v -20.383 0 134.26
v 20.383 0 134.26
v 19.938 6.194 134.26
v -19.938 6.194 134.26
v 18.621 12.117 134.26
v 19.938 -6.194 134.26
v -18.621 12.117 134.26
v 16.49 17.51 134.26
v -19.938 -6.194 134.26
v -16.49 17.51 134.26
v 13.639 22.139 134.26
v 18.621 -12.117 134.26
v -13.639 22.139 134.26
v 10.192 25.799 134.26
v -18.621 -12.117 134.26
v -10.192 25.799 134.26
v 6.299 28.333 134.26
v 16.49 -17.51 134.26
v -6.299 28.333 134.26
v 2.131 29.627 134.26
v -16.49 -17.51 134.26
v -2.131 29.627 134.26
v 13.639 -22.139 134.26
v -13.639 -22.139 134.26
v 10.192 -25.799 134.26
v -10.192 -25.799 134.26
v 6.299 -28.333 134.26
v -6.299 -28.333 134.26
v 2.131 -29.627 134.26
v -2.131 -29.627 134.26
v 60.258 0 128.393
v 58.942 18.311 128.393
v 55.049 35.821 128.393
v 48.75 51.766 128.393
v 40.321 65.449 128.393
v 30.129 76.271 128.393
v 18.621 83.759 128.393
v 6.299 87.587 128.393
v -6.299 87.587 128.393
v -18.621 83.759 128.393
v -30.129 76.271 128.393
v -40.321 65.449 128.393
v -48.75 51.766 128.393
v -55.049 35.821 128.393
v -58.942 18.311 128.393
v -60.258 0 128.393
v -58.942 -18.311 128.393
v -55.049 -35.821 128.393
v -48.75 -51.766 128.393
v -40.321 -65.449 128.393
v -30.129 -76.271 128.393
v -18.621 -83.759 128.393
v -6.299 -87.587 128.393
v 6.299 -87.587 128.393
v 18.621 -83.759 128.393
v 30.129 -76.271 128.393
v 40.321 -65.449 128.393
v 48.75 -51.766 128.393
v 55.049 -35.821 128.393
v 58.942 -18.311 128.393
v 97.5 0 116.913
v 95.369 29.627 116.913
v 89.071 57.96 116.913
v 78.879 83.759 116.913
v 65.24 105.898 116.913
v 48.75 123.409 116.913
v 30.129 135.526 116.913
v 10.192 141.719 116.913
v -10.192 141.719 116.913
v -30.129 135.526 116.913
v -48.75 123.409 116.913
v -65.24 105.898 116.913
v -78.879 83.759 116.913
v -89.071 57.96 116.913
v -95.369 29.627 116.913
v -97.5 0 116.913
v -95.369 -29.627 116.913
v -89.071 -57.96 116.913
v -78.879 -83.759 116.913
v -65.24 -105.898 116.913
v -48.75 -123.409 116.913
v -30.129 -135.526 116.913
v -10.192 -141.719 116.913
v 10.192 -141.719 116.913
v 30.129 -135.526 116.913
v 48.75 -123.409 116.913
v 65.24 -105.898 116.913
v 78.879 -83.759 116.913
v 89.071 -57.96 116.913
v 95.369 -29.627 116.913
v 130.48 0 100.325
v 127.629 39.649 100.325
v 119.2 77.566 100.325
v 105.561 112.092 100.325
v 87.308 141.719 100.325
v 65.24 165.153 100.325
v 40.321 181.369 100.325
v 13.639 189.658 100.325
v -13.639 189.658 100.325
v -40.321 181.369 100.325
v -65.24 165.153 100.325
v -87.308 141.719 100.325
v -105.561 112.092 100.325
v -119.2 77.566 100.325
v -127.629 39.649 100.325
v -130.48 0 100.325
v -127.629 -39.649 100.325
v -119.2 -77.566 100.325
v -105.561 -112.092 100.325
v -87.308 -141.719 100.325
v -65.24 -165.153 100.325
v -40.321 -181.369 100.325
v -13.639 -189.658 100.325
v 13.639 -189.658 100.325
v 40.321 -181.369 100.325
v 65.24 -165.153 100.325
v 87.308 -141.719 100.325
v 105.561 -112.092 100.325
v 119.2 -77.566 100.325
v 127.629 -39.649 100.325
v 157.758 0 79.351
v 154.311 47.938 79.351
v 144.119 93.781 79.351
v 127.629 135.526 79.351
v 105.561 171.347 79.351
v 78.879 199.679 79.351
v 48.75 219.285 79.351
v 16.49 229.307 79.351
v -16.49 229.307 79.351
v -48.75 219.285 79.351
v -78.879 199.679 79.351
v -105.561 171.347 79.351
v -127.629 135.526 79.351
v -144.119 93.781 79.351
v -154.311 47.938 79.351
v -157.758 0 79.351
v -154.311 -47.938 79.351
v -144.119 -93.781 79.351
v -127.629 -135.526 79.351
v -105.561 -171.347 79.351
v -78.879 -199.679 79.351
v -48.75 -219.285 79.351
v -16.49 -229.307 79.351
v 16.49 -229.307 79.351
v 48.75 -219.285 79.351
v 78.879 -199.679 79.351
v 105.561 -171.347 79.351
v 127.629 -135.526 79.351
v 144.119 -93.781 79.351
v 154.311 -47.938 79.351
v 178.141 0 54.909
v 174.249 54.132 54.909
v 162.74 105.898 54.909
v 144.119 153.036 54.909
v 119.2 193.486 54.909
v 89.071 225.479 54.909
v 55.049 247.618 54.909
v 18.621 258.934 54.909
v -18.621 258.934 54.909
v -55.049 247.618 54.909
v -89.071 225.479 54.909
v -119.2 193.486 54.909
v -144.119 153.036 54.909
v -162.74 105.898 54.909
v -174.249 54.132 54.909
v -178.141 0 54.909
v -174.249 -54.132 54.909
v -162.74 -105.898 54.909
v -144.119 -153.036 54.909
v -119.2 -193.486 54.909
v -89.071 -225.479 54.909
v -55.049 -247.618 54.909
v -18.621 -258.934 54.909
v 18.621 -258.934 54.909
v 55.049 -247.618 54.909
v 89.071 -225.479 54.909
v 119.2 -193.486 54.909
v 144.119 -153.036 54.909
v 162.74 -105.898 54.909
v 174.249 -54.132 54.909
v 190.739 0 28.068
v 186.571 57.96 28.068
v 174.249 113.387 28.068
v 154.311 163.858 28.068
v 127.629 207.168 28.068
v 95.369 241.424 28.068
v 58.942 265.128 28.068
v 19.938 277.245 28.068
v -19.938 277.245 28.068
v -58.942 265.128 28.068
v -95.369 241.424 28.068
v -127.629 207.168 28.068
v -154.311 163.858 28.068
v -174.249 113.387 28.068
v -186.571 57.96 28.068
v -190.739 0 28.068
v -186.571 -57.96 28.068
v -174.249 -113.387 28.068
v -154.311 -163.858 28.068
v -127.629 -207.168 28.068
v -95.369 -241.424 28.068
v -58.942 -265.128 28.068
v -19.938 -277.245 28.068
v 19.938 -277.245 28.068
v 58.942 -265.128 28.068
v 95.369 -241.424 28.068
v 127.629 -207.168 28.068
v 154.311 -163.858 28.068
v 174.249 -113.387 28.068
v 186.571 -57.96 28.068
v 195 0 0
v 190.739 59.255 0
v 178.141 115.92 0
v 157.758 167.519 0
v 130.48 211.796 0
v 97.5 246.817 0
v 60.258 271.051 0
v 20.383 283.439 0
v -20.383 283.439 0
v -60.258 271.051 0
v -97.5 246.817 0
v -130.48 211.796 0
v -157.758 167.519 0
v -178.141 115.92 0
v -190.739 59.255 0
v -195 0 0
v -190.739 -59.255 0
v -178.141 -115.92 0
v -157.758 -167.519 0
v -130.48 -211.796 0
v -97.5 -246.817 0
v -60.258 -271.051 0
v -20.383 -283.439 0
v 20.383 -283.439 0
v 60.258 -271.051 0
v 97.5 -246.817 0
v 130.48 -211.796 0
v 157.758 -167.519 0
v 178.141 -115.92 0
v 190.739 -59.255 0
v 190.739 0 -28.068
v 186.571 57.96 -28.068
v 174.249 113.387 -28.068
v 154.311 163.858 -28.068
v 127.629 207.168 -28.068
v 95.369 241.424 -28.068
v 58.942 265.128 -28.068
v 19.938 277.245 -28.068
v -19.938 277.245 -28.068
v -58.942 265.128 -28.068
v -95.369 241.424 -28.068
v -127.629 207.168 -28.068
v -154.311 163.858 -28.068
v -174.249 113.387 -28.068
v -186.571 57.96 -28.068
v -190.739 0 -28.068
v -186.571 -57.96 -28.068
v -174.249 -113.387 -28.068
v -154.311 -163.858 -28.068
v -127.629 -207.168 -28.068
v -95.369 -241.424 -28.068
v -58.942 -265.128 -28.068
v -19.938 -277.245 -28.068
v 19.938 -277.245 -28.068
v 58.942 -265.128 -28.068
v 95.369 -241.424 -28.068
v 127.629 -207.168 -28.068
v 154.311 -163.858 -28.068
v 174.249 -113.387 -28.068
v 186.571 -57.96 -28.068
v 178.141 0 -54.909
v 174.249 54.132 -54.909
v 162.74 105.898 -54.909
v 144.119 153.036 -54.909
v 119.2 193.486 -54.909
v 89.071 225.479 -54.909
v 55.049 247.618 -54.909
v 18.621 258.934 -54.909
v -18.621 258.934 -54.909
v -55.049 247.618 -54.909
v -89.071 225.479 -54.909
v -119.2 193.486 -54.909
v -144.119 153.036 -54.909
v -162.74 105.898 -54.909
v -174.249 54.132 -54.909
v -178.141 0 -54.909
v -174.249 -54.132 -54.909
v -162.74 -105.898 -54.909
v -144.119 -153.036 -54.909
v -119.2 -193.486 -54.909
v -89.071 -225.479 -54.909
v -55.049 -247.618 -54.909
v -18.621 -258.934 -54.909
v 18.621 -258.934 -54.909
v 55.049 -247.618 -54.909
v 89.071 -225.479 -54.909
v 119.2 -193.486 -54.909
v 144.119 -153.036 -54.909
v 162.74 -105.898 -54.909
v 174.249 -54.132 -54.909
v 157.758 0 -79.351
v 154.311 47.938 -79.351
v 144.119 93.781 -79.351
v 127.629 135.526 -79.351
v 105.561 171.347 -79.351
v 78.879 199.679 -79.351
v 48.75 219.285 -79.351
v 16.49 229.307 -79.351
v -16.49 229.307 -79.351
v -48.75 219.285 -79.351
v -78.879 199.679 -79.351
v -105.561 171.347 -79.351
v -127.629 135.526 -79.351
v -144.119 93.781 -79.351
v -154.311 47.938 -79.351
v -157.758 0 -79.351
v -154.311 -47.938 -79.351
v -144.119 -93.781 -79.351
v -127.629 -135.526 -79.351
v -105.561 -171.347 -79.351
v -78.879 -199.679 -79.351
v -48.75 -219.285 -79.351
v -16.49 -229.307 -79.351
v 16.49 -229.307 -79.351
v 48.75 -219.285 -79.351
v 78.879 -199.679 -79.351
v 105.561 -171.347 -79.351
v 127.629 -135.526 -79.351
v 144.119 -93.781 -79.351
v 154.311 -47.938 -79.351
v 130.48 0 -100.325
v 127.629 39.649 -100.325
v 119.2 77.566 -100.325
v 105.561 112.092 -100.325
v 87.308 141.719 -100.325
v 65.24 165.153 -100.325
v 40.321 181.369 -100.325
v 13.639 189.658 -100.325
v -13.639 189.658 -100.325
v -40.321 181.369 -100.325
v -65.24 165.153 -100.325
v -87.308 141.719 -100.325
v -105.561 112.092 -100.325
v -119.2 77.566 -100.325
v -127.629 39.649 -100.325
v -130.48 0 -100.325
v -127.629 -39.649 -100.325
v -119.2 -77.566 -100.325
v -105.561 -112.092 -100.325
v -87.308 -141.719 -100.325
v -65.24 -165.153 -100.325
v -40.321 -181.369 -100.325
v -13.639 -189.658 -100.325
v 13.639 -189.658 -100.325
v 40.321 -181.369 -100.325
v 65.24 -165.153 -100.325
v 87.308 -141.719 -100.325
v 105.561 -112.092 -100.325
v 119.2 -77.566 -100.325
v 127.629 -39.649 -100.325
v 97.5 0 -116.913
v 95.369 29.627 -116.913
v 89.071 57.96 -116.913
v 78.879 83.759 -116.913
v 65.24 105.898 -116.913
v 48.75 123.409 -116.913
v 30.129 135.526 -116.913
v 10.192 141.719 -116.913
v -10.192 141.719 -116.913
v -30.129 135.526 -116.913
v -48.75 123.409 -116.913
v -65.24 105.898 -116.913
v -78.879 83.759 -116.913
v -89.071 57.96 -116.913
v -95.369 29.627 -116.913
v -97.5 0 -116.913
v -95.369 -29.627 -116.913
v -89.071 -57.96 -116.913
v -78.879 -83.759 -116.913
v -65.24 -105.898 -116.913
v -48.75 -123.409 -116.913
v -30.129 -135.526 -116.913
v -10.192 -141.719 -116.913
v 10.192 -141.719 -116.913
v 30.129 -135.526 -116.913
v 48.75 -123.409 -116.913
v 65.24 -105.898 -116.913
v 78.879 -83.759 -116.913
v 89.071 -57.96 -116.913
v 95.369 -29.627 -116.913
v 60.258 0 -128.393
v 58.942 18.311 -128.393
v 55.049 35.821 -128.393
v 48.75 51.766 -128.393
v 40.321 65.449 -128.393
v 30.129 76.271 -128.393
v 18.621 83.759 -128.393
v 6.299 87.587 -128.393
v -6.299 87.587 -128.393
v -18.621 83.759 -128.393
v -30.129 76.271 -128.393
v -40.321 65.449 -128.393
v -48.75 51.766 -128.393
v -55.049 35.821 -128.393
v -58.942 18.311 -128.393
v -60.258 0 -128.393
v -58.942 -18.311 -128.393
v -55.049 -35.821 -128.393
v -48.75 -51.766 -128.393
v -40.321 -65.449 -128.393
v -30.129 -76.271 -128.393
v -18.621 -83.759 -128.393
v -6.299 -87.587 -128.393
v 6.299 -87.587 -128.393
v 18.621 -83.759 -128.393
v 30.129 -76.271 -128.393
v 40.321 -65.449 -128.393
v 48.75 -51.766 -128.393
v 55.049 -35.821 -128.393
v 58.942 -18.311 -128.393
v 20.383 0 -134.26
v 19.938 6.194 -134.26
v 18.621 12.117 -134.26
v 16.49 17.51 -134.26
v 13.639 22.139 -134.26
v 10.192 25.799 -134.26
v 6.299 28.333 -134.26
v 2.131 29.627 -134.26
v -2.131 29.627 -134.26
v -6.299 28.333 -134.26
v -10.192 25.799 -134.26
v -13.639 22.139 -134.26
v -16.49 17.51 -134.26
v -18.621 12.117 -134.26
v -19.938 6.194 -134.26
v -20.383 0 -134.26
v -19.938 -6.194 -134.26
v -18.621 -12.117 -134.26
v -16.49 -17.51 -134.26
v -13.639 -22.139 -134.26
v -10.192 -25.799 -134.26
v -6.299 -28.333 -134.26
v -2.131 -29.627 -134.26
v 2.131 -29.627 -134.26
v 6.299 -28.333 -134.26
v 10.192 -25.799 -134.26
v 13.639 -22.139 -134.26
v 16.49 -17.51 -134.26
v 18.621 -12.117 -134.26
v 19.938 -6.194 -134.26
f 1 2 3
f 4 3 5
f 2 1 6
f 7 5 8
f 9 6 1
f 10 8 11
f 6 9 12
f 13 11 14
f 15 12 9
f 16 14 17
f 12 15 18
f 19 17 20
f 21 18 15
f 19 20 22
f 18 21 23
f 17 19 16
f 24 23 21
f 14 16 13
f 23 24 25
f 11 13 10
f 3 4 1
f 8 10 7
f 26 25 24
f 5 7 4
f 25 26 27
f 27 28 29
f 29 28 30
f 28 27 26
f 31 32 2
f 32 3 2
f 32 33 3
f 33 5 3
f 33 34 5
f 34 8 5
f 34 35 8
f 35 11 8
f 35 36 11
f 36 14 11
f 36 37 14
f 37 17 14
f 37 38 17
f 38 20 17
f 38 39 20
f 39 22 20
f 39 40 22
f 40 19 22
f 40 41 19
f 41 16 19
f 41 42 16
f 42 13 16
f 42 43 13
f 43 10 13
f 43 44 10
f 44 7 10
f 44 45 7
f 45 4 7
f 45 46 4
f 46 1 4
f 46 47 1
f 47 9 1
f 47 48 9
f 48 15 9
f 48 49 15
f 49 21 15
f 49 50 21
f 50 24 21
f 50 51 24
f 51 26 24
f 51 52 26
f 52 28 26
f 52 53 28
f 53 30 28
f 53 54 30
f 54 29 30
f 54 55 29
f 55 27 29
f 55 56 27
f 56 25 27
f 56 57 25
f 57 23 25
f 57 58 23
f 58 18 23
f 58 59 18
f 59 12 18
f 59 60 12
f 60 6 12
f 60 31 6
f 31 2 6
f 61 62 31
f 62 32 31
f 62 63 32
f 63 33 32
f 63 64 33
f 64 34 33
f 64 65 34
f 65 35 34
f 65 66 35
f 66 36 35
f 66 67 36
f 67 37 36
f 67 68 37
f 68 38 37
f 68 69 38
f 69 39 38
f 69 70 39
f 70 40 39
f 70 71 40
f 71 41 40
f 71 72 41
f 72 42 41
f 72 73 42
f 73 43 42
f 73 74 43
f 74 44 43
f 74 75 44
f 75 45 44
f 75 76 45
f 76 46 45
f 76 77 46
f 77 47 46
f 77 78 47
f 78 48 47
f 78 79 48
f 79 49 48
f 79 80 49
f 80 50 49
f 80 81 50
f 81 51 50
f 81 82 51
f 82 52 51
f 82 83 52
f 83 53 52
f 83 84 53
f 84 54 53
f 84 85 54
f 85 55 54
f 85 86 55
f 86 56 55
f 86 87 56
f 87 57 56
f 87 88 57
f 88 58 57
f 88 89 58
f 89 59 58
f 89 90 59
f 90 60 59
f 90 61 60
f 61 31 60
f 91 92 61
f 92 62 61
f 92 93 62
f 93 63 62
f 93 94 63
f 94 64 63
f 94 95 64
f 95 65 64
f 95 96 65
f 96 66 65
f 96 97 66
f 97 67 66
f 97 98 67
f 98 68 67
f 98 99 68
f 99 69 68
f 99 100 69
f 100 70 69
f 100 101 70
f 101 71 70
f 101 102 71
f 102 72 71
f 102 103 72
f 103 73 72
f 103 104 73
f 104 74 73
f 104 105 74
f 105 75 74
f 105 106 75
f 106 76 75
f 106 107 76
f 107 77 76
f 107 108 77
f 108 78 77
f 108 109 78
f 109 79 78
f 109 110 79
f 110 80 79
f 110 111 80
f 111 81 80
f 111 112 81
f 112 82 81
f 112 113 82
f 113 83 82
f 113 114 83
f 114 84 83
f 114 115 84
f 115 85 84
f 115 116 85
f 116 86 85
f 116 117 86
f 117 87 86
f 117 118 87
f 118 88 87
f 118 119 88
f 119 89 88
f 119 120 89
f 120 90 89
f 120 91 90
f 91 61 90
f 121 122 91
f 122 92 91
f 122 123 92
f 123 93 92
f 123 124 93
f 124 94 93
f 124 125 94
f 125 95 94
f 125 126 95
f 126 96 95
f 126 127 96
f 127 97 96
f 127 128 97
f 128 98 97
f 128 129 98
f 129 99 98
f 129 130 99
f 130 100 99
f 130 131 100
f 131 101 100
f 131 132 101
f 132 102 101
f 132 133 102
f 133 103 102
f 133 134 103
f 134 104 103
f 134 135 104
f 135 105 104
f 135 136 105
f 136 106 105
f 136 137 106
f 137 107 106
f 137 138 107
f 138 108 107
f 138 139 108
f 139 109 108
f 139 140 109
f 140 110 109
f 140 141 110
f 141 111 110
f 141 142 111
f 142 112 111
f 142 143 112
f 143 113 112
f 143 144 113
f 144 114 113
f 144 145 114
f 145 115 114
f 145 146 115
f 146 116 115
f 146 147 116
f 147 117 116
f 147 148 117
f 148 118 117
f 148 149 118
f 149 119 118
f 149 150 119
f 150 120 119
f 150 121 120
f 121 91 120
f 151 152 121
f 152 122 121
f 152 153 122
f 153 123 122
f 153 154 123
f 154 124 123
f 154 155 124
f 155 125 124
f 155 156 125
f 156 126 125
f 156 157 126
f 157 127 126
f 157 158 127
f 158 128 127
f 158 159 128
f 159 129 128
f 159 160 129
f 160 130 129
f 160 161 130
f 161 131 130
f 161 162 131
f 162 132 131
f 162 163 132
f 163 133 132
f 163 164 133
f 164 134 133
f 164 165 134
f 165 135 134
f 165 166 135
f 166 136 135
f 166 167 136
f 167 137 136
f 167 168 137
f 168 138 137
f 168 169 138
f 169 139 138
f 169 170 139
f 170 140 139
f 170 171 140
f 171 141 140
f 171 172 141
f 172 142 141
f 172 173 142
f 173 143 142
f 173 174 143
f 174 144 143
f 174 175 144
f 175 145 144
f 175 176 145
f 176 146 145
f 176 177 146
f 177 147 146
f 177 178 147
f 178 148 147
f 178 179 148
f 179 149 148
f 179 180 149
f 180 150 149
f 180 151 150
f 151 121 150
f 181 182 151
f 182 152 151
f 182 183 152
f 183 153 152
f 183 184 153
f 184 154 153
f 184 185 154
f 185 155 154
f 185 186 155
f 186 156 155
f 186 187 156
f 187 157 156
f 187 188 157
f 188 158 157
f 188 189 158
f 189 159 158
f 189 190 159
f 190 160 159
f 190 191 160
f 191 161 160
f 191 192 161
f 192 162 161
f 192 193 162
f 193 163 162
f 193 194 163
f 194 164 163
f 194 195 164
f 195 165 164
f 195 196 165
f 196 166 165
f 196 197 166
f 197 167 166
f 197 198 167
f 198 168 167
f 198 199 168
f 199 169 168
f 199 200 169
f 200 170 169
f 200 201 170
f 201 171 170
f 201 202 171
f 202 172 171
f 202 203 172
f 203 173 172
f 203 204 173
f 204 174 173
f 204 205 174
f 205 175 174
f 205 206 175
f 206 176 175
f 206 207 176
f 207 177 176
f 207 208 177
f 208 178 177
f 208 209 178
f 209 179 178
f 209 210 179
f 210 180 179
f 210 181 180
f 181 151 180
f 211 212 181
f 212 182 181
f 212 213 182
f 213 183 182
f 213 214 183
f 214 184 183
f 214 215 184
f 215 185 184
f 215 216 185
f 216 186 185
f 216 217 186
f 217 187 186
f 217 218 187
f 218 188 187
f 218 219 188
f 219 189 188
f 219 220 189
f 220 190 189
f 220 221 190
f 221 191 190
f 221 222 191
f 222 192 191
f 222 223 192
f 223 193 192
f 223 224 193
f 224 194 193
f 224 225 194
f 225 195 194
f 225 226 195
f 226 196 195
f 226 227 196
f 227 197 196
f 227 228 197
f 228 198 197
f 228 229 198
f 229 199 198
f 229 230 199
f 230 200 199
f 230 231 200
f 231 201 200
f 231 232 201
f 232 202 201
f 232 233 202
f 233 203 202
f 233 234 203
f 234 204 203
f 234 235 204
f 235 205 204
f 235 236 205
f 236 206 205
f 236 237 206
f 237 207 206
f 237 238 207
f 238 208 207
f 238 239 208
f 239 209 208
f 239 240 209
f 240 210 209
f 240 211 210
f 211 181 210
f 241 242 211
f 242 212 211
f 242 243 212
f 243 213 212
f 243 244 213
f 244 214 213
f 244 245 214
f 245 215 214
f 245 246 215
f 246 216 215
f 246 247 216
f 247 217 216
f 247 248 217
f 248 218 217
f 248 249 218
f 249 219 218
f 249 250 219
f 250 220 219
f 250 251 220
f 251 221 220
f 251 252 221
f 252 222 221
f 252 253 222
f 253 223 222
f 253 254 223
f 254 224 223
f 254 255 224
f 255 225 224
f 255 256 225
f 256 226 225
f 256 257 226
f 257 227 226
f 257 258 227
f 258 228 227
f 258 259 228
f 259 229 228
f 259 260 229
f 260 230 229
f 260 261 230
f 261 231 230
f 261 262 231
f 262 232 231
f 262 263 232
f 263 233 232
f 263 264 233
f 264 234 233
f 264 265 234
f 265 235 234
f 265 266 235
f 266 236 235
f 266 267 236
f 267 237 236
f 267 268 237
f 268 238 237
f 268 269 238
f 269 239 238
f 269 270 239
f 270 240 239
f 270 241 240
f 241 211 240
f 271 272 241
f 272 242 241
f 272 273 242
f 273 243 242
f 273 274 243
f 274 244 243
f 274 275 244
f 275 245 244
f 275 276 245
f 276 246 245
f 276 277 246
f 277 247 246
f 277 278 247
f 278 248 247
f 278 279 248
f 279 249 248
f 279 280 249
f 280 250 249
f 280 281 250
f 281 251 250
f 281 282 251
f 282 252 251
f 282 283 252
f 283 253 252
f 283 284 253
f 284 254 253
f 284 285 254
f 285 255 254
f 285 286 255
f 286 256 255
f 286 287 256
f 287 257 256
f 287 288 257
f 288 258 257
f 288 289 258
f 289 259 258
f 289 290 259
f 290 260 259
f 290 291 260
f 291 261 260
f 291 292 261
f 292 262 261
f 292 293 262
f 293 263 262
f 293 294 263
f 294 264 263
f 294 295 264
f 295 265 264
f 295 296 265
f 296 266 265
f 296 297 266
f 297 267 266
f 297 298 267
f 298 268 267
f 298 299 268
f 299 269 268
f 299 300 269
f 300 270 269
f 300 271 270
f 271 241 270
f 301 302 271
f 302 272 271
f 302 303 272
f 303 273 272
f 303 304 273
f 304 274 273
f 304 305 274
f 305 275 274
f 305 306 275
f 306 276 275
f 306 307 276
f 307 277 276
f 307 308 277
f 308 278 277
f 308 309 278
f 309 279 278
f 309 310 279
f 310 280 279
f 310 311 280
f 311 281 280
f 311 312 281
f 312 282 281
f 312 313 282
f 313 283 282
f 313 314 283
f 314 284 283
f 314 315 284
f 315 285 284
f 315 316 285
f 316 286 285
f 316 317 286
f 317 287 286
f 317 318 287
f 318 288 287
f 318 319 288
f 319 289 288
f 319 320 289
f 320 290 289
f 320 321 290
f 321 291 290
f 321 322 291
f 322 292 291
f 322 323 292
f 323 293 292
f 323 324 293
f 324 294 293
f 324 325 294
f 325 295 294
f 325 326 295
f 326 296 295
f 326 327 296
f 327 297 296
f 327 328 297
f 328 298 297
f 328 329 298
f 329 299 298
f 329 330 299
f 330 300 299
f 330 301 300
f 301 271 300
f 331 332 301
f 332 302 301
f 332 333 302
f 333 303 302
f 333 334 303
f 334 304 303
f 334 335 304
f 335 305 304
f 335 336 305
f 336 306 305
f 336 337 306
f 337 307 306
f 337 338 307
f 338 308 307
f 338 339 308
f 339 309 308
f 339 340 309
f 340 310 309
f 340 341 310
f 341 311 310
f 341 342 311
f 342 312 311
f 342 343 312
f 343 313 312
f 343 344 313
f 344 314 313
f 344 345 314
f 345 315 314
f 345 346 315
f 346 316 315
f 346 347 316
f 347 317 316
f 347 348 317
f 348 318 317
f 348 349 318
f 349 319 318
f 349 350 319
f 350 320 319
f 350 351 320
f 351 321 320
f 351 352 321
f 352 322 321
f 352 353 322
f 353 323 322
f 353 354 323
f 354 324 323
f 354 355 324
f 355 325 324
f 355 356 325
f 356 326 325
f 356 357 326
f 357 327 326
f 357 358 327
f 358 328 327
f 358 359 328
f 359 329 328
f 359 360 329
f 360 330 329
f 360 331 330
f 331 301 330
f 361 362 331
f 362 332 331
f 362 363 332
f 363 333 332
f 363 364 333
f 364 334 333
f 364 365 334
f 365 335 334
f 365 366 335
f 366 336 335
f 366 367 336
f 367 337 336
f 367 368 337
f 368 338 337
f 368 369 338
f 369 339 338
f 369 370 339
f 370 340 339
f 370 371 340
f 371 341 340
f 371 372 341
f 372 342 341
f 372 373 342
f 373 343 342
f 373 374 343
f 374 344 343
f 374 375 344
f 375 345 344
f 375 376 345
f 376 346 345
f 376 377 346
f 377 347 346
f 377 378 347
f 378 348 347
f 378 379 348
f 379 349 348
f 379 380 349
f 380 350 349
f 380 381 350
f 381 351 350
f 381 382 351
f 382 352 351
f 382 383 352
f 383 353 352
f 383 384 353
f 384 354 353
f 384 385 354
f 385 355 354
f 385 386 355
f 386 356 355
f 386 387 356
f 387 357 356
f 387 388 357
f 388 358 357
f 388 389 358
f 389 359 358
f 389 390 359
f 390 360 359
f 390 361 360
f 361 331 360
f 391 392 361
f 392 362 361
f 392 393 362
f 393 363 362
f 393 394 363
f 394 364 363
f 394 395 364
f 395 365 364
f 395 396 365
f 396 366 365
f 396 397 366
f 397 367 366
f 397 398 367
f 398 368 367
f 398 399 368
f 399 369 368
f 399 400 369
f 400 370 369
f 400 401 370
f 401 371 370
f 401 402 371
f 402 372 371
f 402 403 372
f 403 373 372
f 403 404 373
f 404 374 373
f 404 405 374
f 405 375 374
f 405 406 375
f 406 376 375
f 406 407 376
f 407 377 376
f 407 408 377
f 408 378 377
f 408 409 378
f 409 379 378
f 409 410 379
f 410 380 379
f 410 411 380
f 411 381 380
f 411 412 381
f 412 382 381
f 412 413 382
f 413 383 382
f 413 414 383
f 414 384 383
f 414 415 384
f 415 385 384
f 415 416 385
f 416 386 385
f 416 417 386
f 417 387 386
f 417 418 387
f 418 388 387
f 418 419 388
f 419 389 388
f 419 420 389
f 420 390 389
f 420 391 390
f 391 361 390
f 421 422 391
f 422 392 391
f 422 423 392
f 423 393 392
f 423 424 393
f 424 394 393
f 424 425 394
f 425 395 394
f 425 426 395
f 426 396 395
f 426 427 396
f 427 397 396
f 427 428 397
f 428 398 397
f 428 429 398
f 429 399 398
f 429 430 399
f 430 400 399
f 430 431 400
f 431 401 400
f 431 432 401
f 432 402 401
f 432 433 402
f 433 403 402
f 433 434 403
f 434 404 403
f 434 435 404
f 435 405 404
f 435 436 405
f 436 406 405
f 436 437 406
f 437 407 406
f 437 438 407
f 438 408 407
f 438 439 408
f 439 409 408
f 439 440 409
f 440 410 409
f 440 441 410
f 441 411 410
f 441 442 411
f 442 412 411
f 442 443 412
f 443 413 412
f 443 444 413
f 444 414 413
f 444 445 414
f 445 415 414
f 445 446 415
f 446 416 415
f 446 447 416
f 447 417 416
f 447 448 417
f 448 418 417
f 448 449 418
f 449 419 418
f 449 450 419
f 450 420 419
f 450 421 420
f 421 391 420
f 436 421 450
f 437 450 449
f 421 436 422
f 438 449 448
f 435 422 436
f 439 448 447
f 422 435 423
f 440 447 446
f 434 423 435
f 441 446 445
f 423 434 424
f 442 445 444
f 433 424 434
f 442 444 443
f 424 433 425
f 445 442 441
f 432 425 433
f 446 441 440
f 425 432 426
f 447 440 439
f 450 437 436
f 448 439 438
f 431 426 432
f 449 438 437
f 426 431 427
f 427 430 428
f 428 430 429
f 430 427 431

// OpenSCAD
// Generated by SolidPython 1.0.1 on 2020-07-29 00:46:51


scale(v = [13, 19, 9]) {
	sphere(r = 15);
}
/***********************************************
*********      SolidPython code:      **********
************************************************
 
# import packages: SolidPython
from solid import *
from solid.utils import *
from itertools import chain, combinations, permutations


class Resize:

    def __init__(self, scad_file):
        self.scad_file = scad_file
        #self.scad_file = import_scad(scad_file)
        # cone/cylinder param:
        self.r1 = 0
        self.r2 = 0
        self.h = 0
        # rectangular prism param:
        self.w = 0
        self.l = 0
        # ellipse param:
        self.r = 0

    # import OpenScad code (file name corresponds to shape)


    # classify shape + parameters
    def assign(self, param1, param2, param3):
        if self.scad_file == 'cone.scad':
            self.r1 = param1
            self.r2 = param2
            self.h = param3
        elif self.scad_file == 'cylinder.scad':
            self.r1 = param1
            self.r2 = param2
            self.h = param3
        elif self.scad_file == 'rectangularPrism.scad':
            self.h = param1
            self.l = param2
            self.w = param3
        else:
            self.r = param1
            self.h = param2

    # resize parameters
    def iterate(self):
        x = range(3, 20, 2)
        i = 1
        if self.scad_file == 'cone.scad':
            tempList = list(permutations(x, 2))
            for temp in tempList:
                param1 = temp[0]
                param2 = temp[1]
                filepath = 'produced_scad_files/' + 'cone' + str(param1) + '_' + str(param2) + '_' + '.scad'
                scad_render_to_file(cylinder(h=param1, r1=param2, r2=0), filepath)

        elif self.scad_file == 'cylinder.scad':
            tempList = list(permutations(x, 3))
            for temp in tempList:
                param1 = temp[0]
                param2 = temp[1]
                filepath = 'produced_scad_files/' + 'cylinder' + str(param1) + '_' + str(param2) + '_' + '.scad'
                scad_render_to_file(cylinder(h=param1, r1=param2, r2=param2), filepath)

        elif self.scad_file == 'rectangularPrism.scad':
            tempList = list(permutations(x, 3))
            for temp in tempList:
                param1 = temp[0]
                param2 = temp[1]
                param3 = temp[2]
                filepath = 'produced_scad_files/' + 'rectangularPrism' + str(param1) + '_' + str(param2) + '_' + str(
                    param3) + '.scad'
                scad_render_to_file(cube(size=(param1, param2, param3)), filepath)

        elif self.scad_file == 'ellipse.scad':
            tempList = list(permutations(x, 4))
            for temp in tempList:
                param1 = temp[0]
                param2 = temp[1]
                param3 = temp[2]
                param4 = temp[3]
                filepath = 'produced_scad_files/' + 'ellipse' + str(param1) + '_' + str(param2) + '_' + str(param3) + '_' + str(param4) + '.scad'
                scad_render_to_file(scale([param1, param2, param3])(sphere(r=param4)), filepath)

    def render_to_scadfile(self):
        scad_render_to_file(scad, 'example.scad') 
 
************************************************/
